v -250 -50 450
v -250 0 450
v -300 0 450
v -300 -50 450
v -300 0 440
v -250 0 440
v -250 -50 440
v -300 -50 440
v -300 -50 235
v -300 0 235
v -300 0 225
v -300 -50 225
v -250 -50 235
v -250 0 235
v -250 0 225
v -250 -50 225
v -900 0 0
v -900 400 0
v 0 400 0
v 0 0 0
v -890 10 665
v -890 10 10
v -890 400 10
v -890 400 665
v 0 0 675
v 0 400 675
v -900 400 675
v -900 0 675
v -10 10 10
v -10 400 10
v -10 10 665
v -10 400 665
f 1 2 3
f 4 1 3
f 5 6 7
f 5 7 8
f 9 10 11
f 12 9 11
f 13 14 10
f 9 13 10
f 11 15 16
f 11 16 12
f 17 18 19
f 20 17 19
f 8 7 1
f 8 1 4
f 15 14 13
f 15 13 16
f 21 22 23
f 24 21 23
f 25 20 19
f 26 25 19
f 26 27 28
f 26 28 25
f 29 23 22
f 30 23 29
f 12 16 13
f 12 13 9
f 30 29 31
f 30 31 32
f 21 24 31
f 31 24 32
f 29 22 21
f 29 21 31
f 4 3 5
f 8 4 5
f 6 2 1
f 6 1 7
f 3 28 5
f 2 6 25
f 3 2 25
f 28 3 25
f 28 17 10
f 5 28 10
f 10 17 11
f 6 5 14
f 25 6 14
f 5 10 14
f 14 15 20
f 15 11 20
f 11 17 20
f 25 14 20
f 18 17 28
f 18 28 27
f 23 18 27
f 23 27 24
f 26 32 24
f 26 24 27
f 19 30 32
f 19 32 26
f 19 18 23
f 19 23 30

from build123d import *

# Parameters (mm, degrees)
SKETCH1_W           = 900
SKETCH1_H           = 400
BOSS_EXTRUDE1_DEPTH = 675
SHELL1_T            = -10
SKETCH3_W           = 50
SKETCH3_H           = 10
BOSS_EXTRUDE4_DEPTH = 50


with BuildPart() as part:
    # Sketch1 → Boss-Extrude1 (new body)
    with BuildSketch(Plane.XY):
        with Locations((-450, 200)):
            Rectangle(SKETCH1_W, SKETCH1_H)
    extrude(amount=BOSS_EXTRUDE1_DEPTH)

    # Shell1
    shell1_openings = [part.faces().sort_by_distance(p)[0] for p in [
        (-450, 400, 337.5),
    ]]
    offset(amount=SHELL1_T, openings=shell1_openings, kind=Kind.INTERSECTION)

    # Sketch3 → Boss-Extrude4 (add)
    with BuildSketch(Plane(origin=(0, 0, 0), x_dir=(-1, 0, 0), z_dir=(0, -1, 0))):
        with Locations((275, -230)):
            Rectangle(SKETCH3_W, SKETCH3_H)
        with Locations((275, -445)):
            Rectangle(SKETCH3_W, SKETCH3_H)
    extrude(amount=BOSS_EXTRUDE4_DEPTH)


solid = part.part
